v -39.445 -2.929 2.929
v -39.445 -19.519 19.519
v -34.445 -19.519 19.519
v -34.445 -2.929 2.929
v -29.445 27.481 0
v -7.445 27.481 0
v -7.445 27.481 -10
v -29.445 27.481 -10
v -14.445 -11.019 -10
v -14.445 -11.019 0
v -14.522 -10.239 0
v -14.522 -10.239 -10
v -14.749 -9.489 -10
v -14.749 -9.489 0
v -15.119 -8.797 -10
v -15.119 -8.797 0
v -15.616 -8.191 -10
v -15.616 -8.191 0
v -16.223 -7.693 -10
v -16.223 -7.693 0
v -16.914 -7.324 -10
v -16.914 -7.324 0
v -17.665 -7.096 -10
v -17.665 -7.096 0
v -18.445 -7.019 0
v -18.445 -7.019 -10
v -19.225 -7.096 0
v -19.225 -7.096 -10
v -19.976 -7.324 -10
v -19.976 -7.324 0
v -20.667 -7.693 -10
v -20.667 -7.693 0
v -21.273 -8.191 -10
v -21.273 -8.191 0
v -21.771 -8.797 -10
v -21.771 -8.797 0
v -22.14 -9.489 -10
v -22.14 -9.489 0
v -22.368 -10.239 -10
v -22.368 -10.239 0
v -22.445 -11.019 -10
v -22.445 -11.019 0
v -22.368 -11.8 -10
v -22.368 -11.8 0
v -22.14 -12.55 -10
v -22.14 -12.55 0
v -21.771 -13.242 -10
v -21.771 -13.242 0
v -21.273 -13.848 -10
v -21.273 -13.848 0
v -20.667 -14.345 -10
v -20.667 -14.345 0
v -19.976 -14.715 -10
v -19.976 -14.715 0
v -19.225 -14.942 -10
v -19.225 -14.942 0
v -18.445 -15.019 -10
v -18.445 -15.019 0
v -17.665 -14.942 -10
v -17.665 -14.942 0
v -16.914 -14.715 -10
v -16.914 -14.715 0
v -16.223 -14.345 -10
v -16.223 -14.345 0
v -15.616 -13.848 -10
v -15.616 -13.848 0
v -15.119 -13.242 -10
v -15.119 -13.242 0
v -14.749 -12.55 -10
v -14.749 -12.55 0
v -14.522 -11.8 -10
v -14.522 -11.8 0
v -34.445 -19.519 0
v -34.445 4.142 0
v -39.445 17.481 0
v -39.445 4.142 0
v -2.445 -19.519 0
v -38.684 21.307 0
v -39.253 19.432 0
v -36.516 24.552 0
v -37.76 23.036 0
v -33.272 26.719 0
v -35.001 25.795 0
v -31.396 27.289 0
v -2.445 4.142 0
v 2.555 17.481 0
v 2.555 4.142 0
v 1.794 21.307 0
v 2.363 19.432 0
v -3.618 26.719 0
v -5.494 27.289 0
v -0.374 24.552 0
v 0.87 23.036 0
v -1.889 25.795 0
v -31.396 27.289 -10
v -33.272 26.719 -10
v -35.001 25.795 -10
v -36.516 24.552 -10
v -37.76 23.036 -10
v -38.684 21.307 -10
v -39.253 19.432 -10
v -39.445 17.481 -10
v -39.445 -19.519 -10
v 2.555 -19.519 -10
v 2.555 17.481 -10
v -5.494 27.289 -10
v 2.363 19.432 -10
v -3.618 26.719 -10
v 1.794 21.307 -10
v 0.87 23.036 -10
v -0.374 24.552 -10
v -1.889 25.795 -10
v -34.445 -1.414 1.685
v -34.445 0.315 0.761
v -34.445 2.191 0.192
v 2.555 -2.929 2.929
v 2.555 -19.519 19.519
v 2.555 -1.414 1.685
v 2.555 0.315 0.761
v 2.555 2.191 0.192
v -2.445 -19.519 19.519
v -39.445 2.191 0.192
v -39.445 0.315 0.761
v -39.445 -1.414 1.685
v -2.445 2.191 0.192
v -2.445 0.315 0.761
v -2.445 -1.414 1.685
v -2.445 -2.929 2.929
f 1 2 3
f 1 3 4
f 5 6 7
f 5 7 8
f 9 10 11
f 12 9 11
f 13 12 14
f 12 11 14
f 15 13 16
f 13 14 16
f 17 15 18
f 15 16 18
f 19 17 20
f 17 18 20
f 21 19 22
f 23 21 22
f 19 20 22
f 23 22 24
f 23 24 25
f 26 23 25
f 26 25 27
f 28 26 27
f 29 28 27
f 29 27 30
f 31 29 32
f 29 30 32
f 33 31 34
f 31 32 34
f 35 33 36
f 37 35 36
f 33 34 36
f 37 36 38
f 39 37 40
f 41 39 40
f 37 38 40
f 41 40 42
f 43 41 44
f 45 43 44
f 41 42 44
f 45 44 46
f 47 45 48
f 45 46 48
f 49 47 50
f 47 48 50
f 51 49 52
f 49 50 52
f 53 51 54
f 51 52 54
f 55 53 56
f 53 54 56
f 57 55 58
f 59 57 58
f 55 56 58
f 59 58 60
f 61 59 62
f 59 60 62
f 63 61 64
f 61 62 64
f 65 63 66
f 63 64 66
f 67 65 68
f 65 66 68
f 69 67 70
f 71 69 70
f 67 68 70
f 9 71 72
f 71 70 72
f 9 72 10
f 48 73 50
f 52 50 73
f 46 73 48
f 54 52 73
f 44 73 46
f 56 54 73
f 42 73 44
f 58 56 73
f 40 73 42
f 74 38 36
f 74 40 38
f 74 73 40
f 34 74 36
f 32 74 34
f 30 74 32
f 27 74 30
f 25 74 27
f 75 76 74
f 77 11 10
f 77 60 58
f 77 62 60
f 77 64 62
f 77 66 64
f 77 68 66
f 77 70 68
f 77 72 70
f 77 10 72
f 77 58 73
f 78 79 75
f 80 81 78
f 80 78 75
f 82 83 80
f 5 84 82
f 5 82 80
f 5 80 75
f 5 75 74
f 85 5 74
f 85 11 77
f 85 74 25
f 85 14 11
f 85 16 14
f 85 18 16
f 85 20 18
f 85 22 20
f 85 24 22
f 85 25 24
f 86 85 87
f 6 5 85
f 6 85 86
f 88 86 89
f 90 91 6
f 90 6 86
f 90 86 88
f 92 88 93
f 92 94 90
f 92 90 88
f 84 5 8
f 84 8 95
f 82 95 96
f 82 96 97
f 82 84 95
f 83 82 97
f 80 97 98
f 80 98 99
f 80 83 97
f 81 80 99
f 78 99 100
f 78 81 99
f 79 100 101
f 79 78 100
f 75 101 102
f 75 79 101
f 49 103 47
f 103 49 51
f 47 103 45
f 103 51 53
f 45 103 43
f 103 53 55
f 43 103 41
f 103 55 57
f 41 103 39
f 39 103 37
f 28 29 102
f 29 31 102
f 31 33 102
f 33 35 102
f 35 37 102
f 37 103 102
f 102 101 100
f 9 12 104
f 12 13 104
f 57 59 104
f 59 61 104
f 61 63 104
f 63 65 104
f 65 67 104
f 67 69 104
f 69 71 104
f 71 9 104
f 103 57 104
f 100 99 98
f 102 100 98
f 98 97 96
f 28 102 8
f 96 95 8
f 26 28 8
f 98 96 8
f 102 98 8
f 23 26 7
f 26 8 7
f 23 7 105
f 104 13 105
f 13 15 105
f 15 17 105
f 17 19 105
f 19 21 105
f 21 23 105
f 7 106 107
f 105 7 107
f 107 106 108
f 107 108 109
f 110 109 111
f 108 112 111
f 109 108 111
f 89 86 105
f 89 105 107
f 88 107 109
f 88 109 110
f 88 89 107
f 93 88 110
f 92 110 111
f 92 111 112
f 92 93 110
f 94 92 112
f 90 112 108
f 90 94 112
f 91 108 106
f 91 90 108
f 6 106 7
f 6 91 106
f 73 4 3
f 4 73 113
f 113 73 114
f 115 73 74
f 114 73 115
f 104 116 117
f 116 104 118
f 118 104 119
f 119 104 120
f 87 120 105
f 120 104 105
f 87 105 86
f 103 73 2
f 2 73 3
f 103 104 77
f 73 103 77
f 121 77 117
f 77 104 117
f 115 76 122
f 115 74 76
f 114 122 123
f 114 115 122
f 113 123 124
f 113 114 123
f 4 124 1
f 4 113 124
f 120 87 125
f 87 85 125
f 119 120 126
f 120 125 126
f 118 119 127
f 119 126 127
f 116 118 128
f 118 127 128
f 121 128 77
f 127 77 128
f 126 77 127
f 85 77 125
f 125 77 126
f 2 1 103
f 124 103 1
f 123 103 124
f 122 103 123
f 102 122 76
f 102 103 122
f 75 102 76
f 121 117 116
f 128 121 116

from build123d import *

# Parameters (mm, degrees)
SKETCH1_R            = 4
BOSS_EXTRUDE1_DEPTH  = 10
BOSS_EXTRUDE2_DEPTH  = 5
FILLET1_R            = 10
FILLET1_OF_MIRROR1_R = 10


with BuildPart() as part:
    # Sketch1 → Boss-Extrude1 (new body)
    with BuildSketch(Plane.XY):
        with BuildLine():
            Line((-7.444896481, 27.480652594), (-29.444896481, 27.480652594))
            ThreePointArc((-29.444896481, 27.480652594), (-36.515964293, 24.551720406), (-39.444896481, 17.480652594))
            Line((-39.444896481, 17.480652594), (-39.444896481, -19.519347406))
            Line((-39.444896481, -19.519347406), (2.555103519, -19.519347406))
            Line((2.555103519, -19.519347406), (2.555103519, 17.480652594))
            ThreePointArc((2.555103519, 17.480652594), (-0.373828669, 24.551720406), (-7.444896481, 27.480652594))
        make_face()
        with Locations((-18.444896481, -11.019347406)):
            Circle(SKETCH1_R, mode=Mode.SUBTRACT)
    extrude(amount=-BOSS_EXTRUDE1_DEPTH)

    # Sketch2 → Boss-Extrude2 (add)
    with BuildSketch(Plane.ZY.offset(39.444896481)):
        Polygon((0, -19.519347406), (19.519347406, -19.519347406), (0, 0), align=None)
    boss_extrude2 = extrude(amount=-BOSS_EXTRUDE2_DEPTH)

    # Fillet1
    fillet1_edges = [part.edges().sort_by_distance(p)[0] for p in [
        (-36.944896481, 0, 0),
    ]]
    fillet(fillet1_edges, radius=FILLET1_R)

    # Mirror1: Boss-Extrude2 across plane
    add(boss_extrude2.mirror(Plane(origin=(-18.444896481, 0, 0), x_dir=(0, 0, 1), z_dir=(1, 0, 0))))

    # Fillet1 of Mirror1
    fillet1_of_mirror1_edges = [part.edges().sort_by_distance(p)[0] for p in [
        (0.055103519, 0, 0),
    ]]
    fillet(fillet1_of_mirror1_edges, radius=FILLET1_OF_MIRROR1_R)


solid = part.part
